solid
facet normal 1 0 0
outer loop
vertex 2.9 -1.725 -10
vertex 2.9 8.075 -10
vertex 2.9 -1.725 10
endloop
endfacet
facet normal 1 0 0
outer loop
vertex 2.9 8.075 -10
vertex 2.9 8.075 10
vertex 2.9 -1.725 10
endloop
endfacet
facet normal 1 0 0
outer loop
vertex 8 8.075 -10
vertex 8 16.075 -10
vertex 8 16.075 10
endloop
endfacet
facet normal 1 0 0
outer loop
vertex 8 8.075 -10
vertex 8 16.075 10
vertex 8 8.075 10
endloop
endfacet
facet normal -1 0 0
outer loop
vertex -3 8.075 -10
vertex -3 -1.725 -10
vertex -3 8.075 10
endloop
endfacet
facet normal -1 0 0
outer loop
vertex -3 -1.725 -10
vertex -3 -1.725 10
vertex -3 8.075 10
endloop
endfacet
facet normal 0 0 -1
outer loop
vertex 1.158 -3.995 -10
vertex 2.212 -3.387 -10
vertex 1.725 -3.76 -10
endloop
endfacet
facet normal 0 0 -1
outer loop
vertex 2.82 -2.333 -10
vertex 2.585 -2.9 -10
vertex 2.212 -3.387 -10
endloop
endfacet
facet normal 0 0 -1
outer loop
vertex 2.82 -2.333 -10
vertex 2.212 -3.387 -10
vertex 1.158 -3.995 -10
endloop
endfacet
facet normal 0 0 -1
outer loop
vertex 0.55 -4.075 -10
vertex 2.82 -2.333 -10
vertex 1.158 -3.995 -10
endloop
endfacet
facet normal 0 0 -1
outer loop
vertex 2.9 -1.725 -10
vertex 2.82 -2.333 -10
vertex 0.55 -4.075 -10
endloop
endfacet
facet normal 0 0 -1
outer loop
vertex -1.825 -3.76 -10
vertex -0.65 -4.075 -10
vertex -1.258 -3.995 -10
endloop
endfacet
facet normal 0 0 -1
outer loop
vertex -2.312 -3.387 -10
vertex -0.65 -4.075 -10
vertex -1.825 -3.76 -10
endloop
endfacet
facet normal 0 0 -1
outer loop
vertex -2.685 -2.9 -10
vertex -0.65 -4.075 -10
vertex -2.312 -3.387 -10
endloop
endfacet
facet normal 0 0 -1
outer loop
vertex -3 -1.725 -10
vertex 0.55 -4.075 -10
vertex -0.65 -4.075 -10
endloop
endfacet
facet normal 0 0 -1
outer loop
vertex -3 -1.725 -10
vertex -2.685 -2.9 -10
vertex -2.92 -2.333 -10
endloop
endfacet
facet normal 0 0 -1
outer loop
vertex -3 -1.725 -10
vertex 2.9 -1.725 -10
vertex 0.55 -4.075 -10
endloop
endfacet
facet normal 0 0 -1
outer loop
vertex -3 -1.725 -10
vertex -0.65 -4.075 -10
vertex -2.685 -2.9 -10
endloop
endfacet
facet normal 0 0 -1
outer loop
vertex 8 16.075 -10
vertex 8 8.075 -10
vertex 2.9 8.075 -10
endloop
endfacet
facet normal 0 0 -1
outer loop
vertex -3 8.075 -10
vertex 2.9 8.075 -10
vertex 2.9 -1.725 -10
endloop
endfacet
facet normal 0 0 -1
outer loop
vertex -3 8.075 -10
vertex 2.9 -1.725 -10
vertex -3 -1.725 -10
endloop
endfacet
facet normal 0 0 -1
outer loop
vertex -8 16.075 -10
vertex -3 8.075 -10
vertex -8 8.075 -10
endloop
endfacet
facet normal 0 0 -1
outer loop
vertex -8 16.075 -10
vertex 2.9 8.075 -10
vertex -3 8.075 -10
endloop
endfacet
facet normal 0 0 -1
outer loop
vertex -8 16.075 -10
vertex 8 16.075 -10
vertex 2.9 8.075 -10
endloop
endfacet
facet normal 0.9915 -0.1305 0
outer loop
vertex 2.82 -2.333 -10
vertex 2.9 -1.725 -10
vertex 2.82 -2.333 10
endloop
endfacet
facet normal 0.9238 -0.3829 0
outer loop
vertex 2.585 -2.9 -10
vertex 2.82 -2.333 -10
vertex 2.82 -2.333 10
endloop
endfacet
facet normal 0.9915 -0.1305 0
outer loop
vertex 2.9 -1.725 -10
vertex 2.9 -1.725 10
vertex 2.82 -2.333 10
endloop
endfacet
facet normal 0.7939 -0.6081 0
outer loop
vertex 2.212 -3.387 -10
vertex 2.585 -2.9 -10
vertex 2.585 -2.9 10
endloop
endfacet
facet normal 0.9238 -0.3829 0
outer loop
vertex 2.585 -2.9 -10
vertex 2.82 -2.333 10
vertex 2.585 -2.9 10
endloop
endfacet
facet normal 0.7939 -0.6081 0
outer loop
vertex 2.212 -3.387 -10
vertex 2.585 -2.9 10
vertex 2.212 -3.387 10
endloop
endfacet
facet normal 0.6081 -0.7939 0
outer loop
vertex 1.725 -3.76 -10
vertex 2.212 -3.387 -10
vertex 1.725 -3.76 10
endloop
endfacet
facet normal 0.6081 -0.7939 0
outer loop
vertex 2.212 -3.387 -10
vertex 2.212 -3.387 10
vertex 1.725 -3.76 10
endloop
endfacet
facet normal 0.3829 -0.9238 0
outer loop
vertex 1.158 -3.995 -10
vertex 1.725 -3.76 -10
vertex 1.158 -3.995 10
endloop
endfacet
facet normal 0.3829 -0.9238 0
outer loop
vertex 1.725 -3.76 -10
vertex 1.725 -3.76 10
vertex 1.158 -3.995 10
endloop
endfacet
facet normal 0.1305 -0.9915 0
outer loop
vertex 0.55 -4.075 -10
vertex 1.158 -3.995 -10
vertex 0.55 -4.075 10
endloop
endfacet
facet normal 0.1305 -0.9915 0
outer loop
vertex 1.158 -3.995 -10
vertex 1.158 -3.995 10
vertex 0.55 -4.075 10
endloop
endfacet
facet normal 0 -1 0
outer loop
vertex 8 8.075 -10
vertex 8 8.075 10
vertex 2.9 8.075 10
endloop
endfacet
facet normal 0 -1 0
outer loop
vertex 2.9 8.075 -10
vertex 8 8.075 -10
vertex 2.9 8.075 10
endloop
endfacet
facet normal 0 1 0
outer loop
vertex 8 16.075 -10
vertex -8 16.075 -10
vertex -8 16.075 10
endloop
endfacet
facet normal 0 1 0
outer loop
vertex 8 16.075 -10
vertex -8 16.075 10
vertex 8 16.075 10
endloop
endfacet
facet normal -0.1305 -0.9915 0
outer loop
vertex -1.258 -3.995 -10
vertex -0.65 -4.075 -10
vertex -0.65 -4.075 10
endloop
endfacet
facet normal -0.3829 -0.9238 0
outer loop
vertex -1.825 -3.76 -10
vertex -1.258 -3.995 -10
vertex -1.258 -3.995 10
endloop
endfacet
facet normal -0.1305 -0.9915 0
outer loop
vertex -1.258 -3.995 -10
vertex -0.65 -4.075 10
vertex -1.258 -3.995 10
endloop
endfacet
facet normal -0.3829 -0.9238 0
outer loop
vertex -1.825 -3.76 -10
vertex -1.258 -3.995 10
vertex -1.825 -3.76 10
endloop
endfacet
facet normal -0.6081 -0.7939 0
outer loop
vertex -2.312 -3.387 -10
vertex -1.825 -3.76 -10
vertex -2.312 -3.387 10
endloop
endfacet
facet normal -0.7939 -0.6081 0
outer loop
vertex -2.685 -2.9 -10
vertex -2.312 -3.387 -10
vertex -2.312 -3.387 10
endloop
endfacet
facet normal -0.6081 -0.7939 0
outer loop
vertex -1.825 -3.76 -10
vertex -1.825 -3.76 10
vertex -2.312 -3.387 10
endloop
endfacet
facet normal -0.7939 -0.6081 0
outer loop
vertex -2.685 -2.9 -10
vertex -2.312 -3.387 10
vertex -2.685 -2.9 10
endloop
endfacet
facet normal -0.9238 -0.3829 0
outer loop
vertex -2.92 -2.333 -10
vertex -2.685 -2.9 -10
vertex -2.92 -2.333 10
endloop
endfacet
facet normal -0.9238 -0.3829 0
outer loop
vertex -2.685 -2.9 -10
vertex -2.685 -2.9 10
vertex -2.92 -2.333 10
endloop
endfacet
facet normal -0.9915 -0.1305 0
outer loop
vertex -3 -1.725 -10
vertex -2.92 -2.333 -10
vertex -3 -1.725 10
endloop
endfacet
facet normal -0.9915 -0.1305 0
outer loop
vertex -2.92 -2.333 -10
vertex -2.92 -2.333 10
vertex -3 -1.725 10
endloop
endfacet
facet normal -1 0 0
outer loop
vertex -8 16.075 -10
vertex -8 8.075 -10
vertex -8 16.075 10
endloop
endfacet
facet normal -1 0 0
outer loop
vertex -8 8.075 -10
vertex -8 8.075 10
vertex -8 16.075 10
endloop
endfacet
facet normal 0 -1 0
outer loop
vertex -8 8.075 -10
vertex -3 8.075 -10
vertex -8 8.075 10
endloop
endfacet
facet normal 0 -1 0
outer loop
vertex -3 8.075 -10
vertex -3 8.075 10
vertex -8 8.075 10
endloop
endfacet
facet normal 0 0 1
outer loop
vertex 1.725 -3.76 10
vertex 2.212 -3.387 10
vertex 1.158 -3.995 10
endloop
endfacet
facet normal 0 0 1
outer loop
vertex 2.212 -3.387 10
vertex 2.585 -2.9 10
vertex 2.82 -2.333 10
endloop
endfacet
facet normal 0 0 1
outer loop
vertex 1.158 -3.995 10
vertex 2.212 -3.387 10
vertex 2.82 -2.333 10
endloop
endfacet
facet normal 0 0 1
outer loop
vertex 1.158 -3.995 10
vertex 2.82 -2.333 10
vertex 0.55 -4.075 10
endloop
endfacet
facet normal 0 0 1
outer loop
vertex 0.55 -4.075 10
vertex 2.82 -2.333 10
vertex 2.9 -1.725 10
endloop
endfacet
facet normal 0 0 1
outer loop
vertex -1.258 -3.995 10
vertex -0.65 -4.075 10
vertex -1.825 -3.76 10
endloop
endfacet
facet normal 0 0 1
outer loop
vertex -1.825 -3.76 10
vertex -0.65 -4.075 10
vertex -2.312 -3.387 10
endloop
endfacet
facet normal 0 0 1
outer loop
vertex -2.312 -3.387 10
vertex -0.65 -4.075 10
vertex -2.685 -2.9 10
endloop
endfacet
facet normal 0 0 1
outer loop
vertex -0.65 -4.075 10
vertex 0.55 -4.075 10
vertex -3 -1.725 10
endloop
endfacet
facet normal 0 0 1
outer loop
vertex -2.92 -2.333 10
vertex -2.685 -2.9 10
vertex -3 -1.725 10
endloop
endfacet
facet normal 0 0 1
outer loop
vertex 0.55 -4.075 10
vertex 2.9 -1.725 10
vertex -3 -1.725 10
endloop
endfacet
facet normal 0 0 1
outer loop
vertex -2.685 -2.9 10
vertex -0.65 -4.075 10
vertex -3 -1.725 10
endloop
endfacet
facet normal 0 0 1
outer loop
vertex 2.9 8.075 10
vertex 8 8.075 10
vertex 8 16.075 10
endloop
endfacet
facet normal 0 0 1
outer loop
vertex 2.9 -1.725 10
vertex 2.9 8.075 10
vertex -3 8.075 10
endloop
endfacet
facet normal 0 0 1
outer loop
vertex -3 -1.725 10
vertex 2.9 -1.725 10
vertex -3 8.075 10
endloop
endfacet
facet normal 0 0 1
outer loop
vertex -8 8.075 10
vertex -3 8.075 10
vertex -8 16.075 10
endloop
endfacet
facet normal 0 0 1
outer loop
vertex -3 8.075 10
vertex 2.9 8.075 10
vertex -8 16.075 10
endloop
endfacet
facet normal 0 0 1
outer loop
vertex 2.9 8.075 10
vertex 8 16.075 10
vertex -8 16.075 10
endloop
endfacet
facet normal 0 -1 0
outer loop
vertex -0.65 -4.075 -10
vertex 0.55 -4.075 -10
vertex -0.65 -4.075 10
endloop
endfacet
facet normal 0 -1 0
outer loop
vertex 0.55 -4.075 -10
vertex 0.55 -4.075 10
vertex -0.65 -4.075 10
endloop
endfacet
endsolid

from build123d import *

# Parameters (mm, degrees)
BOSS_EXTRUDE1_DEPTH = 10


with BuildPart() as part:
    # Sketch1 → Boss-Extrude1 (new, symmetric)
    with BuildSketch(Plane.XY):
        with BuildLine():
            Line((8, 8.075), (2.9, 8.075))
            Line((2.9, 8.075), (2.9, -1.725))
            ThreePointArc((2.9, -1.725), (2.211700936, -3.386700936), (0.55, -4.075))
            Line((0.55, -4.075), (-0.65, -4.075))
            ThreePointArc((-0.65, -4.075), (-2.311700936, -3.386700936), (-3, -1.725))
            Line((-3, -1.725), (-3, 8.075))
            Line((-3, 8.075), (-8, 8.075))
            Line((-8, 8.075), (-8, 16.075))
            Line((-8, 16.075), (8, 16.075))
            Line((8, 16.075), (8, 8.075))
        make_face()
    extrude(amount=BOSS_EXTRUDE1_DEPTH, both=True)


solid = part.part
